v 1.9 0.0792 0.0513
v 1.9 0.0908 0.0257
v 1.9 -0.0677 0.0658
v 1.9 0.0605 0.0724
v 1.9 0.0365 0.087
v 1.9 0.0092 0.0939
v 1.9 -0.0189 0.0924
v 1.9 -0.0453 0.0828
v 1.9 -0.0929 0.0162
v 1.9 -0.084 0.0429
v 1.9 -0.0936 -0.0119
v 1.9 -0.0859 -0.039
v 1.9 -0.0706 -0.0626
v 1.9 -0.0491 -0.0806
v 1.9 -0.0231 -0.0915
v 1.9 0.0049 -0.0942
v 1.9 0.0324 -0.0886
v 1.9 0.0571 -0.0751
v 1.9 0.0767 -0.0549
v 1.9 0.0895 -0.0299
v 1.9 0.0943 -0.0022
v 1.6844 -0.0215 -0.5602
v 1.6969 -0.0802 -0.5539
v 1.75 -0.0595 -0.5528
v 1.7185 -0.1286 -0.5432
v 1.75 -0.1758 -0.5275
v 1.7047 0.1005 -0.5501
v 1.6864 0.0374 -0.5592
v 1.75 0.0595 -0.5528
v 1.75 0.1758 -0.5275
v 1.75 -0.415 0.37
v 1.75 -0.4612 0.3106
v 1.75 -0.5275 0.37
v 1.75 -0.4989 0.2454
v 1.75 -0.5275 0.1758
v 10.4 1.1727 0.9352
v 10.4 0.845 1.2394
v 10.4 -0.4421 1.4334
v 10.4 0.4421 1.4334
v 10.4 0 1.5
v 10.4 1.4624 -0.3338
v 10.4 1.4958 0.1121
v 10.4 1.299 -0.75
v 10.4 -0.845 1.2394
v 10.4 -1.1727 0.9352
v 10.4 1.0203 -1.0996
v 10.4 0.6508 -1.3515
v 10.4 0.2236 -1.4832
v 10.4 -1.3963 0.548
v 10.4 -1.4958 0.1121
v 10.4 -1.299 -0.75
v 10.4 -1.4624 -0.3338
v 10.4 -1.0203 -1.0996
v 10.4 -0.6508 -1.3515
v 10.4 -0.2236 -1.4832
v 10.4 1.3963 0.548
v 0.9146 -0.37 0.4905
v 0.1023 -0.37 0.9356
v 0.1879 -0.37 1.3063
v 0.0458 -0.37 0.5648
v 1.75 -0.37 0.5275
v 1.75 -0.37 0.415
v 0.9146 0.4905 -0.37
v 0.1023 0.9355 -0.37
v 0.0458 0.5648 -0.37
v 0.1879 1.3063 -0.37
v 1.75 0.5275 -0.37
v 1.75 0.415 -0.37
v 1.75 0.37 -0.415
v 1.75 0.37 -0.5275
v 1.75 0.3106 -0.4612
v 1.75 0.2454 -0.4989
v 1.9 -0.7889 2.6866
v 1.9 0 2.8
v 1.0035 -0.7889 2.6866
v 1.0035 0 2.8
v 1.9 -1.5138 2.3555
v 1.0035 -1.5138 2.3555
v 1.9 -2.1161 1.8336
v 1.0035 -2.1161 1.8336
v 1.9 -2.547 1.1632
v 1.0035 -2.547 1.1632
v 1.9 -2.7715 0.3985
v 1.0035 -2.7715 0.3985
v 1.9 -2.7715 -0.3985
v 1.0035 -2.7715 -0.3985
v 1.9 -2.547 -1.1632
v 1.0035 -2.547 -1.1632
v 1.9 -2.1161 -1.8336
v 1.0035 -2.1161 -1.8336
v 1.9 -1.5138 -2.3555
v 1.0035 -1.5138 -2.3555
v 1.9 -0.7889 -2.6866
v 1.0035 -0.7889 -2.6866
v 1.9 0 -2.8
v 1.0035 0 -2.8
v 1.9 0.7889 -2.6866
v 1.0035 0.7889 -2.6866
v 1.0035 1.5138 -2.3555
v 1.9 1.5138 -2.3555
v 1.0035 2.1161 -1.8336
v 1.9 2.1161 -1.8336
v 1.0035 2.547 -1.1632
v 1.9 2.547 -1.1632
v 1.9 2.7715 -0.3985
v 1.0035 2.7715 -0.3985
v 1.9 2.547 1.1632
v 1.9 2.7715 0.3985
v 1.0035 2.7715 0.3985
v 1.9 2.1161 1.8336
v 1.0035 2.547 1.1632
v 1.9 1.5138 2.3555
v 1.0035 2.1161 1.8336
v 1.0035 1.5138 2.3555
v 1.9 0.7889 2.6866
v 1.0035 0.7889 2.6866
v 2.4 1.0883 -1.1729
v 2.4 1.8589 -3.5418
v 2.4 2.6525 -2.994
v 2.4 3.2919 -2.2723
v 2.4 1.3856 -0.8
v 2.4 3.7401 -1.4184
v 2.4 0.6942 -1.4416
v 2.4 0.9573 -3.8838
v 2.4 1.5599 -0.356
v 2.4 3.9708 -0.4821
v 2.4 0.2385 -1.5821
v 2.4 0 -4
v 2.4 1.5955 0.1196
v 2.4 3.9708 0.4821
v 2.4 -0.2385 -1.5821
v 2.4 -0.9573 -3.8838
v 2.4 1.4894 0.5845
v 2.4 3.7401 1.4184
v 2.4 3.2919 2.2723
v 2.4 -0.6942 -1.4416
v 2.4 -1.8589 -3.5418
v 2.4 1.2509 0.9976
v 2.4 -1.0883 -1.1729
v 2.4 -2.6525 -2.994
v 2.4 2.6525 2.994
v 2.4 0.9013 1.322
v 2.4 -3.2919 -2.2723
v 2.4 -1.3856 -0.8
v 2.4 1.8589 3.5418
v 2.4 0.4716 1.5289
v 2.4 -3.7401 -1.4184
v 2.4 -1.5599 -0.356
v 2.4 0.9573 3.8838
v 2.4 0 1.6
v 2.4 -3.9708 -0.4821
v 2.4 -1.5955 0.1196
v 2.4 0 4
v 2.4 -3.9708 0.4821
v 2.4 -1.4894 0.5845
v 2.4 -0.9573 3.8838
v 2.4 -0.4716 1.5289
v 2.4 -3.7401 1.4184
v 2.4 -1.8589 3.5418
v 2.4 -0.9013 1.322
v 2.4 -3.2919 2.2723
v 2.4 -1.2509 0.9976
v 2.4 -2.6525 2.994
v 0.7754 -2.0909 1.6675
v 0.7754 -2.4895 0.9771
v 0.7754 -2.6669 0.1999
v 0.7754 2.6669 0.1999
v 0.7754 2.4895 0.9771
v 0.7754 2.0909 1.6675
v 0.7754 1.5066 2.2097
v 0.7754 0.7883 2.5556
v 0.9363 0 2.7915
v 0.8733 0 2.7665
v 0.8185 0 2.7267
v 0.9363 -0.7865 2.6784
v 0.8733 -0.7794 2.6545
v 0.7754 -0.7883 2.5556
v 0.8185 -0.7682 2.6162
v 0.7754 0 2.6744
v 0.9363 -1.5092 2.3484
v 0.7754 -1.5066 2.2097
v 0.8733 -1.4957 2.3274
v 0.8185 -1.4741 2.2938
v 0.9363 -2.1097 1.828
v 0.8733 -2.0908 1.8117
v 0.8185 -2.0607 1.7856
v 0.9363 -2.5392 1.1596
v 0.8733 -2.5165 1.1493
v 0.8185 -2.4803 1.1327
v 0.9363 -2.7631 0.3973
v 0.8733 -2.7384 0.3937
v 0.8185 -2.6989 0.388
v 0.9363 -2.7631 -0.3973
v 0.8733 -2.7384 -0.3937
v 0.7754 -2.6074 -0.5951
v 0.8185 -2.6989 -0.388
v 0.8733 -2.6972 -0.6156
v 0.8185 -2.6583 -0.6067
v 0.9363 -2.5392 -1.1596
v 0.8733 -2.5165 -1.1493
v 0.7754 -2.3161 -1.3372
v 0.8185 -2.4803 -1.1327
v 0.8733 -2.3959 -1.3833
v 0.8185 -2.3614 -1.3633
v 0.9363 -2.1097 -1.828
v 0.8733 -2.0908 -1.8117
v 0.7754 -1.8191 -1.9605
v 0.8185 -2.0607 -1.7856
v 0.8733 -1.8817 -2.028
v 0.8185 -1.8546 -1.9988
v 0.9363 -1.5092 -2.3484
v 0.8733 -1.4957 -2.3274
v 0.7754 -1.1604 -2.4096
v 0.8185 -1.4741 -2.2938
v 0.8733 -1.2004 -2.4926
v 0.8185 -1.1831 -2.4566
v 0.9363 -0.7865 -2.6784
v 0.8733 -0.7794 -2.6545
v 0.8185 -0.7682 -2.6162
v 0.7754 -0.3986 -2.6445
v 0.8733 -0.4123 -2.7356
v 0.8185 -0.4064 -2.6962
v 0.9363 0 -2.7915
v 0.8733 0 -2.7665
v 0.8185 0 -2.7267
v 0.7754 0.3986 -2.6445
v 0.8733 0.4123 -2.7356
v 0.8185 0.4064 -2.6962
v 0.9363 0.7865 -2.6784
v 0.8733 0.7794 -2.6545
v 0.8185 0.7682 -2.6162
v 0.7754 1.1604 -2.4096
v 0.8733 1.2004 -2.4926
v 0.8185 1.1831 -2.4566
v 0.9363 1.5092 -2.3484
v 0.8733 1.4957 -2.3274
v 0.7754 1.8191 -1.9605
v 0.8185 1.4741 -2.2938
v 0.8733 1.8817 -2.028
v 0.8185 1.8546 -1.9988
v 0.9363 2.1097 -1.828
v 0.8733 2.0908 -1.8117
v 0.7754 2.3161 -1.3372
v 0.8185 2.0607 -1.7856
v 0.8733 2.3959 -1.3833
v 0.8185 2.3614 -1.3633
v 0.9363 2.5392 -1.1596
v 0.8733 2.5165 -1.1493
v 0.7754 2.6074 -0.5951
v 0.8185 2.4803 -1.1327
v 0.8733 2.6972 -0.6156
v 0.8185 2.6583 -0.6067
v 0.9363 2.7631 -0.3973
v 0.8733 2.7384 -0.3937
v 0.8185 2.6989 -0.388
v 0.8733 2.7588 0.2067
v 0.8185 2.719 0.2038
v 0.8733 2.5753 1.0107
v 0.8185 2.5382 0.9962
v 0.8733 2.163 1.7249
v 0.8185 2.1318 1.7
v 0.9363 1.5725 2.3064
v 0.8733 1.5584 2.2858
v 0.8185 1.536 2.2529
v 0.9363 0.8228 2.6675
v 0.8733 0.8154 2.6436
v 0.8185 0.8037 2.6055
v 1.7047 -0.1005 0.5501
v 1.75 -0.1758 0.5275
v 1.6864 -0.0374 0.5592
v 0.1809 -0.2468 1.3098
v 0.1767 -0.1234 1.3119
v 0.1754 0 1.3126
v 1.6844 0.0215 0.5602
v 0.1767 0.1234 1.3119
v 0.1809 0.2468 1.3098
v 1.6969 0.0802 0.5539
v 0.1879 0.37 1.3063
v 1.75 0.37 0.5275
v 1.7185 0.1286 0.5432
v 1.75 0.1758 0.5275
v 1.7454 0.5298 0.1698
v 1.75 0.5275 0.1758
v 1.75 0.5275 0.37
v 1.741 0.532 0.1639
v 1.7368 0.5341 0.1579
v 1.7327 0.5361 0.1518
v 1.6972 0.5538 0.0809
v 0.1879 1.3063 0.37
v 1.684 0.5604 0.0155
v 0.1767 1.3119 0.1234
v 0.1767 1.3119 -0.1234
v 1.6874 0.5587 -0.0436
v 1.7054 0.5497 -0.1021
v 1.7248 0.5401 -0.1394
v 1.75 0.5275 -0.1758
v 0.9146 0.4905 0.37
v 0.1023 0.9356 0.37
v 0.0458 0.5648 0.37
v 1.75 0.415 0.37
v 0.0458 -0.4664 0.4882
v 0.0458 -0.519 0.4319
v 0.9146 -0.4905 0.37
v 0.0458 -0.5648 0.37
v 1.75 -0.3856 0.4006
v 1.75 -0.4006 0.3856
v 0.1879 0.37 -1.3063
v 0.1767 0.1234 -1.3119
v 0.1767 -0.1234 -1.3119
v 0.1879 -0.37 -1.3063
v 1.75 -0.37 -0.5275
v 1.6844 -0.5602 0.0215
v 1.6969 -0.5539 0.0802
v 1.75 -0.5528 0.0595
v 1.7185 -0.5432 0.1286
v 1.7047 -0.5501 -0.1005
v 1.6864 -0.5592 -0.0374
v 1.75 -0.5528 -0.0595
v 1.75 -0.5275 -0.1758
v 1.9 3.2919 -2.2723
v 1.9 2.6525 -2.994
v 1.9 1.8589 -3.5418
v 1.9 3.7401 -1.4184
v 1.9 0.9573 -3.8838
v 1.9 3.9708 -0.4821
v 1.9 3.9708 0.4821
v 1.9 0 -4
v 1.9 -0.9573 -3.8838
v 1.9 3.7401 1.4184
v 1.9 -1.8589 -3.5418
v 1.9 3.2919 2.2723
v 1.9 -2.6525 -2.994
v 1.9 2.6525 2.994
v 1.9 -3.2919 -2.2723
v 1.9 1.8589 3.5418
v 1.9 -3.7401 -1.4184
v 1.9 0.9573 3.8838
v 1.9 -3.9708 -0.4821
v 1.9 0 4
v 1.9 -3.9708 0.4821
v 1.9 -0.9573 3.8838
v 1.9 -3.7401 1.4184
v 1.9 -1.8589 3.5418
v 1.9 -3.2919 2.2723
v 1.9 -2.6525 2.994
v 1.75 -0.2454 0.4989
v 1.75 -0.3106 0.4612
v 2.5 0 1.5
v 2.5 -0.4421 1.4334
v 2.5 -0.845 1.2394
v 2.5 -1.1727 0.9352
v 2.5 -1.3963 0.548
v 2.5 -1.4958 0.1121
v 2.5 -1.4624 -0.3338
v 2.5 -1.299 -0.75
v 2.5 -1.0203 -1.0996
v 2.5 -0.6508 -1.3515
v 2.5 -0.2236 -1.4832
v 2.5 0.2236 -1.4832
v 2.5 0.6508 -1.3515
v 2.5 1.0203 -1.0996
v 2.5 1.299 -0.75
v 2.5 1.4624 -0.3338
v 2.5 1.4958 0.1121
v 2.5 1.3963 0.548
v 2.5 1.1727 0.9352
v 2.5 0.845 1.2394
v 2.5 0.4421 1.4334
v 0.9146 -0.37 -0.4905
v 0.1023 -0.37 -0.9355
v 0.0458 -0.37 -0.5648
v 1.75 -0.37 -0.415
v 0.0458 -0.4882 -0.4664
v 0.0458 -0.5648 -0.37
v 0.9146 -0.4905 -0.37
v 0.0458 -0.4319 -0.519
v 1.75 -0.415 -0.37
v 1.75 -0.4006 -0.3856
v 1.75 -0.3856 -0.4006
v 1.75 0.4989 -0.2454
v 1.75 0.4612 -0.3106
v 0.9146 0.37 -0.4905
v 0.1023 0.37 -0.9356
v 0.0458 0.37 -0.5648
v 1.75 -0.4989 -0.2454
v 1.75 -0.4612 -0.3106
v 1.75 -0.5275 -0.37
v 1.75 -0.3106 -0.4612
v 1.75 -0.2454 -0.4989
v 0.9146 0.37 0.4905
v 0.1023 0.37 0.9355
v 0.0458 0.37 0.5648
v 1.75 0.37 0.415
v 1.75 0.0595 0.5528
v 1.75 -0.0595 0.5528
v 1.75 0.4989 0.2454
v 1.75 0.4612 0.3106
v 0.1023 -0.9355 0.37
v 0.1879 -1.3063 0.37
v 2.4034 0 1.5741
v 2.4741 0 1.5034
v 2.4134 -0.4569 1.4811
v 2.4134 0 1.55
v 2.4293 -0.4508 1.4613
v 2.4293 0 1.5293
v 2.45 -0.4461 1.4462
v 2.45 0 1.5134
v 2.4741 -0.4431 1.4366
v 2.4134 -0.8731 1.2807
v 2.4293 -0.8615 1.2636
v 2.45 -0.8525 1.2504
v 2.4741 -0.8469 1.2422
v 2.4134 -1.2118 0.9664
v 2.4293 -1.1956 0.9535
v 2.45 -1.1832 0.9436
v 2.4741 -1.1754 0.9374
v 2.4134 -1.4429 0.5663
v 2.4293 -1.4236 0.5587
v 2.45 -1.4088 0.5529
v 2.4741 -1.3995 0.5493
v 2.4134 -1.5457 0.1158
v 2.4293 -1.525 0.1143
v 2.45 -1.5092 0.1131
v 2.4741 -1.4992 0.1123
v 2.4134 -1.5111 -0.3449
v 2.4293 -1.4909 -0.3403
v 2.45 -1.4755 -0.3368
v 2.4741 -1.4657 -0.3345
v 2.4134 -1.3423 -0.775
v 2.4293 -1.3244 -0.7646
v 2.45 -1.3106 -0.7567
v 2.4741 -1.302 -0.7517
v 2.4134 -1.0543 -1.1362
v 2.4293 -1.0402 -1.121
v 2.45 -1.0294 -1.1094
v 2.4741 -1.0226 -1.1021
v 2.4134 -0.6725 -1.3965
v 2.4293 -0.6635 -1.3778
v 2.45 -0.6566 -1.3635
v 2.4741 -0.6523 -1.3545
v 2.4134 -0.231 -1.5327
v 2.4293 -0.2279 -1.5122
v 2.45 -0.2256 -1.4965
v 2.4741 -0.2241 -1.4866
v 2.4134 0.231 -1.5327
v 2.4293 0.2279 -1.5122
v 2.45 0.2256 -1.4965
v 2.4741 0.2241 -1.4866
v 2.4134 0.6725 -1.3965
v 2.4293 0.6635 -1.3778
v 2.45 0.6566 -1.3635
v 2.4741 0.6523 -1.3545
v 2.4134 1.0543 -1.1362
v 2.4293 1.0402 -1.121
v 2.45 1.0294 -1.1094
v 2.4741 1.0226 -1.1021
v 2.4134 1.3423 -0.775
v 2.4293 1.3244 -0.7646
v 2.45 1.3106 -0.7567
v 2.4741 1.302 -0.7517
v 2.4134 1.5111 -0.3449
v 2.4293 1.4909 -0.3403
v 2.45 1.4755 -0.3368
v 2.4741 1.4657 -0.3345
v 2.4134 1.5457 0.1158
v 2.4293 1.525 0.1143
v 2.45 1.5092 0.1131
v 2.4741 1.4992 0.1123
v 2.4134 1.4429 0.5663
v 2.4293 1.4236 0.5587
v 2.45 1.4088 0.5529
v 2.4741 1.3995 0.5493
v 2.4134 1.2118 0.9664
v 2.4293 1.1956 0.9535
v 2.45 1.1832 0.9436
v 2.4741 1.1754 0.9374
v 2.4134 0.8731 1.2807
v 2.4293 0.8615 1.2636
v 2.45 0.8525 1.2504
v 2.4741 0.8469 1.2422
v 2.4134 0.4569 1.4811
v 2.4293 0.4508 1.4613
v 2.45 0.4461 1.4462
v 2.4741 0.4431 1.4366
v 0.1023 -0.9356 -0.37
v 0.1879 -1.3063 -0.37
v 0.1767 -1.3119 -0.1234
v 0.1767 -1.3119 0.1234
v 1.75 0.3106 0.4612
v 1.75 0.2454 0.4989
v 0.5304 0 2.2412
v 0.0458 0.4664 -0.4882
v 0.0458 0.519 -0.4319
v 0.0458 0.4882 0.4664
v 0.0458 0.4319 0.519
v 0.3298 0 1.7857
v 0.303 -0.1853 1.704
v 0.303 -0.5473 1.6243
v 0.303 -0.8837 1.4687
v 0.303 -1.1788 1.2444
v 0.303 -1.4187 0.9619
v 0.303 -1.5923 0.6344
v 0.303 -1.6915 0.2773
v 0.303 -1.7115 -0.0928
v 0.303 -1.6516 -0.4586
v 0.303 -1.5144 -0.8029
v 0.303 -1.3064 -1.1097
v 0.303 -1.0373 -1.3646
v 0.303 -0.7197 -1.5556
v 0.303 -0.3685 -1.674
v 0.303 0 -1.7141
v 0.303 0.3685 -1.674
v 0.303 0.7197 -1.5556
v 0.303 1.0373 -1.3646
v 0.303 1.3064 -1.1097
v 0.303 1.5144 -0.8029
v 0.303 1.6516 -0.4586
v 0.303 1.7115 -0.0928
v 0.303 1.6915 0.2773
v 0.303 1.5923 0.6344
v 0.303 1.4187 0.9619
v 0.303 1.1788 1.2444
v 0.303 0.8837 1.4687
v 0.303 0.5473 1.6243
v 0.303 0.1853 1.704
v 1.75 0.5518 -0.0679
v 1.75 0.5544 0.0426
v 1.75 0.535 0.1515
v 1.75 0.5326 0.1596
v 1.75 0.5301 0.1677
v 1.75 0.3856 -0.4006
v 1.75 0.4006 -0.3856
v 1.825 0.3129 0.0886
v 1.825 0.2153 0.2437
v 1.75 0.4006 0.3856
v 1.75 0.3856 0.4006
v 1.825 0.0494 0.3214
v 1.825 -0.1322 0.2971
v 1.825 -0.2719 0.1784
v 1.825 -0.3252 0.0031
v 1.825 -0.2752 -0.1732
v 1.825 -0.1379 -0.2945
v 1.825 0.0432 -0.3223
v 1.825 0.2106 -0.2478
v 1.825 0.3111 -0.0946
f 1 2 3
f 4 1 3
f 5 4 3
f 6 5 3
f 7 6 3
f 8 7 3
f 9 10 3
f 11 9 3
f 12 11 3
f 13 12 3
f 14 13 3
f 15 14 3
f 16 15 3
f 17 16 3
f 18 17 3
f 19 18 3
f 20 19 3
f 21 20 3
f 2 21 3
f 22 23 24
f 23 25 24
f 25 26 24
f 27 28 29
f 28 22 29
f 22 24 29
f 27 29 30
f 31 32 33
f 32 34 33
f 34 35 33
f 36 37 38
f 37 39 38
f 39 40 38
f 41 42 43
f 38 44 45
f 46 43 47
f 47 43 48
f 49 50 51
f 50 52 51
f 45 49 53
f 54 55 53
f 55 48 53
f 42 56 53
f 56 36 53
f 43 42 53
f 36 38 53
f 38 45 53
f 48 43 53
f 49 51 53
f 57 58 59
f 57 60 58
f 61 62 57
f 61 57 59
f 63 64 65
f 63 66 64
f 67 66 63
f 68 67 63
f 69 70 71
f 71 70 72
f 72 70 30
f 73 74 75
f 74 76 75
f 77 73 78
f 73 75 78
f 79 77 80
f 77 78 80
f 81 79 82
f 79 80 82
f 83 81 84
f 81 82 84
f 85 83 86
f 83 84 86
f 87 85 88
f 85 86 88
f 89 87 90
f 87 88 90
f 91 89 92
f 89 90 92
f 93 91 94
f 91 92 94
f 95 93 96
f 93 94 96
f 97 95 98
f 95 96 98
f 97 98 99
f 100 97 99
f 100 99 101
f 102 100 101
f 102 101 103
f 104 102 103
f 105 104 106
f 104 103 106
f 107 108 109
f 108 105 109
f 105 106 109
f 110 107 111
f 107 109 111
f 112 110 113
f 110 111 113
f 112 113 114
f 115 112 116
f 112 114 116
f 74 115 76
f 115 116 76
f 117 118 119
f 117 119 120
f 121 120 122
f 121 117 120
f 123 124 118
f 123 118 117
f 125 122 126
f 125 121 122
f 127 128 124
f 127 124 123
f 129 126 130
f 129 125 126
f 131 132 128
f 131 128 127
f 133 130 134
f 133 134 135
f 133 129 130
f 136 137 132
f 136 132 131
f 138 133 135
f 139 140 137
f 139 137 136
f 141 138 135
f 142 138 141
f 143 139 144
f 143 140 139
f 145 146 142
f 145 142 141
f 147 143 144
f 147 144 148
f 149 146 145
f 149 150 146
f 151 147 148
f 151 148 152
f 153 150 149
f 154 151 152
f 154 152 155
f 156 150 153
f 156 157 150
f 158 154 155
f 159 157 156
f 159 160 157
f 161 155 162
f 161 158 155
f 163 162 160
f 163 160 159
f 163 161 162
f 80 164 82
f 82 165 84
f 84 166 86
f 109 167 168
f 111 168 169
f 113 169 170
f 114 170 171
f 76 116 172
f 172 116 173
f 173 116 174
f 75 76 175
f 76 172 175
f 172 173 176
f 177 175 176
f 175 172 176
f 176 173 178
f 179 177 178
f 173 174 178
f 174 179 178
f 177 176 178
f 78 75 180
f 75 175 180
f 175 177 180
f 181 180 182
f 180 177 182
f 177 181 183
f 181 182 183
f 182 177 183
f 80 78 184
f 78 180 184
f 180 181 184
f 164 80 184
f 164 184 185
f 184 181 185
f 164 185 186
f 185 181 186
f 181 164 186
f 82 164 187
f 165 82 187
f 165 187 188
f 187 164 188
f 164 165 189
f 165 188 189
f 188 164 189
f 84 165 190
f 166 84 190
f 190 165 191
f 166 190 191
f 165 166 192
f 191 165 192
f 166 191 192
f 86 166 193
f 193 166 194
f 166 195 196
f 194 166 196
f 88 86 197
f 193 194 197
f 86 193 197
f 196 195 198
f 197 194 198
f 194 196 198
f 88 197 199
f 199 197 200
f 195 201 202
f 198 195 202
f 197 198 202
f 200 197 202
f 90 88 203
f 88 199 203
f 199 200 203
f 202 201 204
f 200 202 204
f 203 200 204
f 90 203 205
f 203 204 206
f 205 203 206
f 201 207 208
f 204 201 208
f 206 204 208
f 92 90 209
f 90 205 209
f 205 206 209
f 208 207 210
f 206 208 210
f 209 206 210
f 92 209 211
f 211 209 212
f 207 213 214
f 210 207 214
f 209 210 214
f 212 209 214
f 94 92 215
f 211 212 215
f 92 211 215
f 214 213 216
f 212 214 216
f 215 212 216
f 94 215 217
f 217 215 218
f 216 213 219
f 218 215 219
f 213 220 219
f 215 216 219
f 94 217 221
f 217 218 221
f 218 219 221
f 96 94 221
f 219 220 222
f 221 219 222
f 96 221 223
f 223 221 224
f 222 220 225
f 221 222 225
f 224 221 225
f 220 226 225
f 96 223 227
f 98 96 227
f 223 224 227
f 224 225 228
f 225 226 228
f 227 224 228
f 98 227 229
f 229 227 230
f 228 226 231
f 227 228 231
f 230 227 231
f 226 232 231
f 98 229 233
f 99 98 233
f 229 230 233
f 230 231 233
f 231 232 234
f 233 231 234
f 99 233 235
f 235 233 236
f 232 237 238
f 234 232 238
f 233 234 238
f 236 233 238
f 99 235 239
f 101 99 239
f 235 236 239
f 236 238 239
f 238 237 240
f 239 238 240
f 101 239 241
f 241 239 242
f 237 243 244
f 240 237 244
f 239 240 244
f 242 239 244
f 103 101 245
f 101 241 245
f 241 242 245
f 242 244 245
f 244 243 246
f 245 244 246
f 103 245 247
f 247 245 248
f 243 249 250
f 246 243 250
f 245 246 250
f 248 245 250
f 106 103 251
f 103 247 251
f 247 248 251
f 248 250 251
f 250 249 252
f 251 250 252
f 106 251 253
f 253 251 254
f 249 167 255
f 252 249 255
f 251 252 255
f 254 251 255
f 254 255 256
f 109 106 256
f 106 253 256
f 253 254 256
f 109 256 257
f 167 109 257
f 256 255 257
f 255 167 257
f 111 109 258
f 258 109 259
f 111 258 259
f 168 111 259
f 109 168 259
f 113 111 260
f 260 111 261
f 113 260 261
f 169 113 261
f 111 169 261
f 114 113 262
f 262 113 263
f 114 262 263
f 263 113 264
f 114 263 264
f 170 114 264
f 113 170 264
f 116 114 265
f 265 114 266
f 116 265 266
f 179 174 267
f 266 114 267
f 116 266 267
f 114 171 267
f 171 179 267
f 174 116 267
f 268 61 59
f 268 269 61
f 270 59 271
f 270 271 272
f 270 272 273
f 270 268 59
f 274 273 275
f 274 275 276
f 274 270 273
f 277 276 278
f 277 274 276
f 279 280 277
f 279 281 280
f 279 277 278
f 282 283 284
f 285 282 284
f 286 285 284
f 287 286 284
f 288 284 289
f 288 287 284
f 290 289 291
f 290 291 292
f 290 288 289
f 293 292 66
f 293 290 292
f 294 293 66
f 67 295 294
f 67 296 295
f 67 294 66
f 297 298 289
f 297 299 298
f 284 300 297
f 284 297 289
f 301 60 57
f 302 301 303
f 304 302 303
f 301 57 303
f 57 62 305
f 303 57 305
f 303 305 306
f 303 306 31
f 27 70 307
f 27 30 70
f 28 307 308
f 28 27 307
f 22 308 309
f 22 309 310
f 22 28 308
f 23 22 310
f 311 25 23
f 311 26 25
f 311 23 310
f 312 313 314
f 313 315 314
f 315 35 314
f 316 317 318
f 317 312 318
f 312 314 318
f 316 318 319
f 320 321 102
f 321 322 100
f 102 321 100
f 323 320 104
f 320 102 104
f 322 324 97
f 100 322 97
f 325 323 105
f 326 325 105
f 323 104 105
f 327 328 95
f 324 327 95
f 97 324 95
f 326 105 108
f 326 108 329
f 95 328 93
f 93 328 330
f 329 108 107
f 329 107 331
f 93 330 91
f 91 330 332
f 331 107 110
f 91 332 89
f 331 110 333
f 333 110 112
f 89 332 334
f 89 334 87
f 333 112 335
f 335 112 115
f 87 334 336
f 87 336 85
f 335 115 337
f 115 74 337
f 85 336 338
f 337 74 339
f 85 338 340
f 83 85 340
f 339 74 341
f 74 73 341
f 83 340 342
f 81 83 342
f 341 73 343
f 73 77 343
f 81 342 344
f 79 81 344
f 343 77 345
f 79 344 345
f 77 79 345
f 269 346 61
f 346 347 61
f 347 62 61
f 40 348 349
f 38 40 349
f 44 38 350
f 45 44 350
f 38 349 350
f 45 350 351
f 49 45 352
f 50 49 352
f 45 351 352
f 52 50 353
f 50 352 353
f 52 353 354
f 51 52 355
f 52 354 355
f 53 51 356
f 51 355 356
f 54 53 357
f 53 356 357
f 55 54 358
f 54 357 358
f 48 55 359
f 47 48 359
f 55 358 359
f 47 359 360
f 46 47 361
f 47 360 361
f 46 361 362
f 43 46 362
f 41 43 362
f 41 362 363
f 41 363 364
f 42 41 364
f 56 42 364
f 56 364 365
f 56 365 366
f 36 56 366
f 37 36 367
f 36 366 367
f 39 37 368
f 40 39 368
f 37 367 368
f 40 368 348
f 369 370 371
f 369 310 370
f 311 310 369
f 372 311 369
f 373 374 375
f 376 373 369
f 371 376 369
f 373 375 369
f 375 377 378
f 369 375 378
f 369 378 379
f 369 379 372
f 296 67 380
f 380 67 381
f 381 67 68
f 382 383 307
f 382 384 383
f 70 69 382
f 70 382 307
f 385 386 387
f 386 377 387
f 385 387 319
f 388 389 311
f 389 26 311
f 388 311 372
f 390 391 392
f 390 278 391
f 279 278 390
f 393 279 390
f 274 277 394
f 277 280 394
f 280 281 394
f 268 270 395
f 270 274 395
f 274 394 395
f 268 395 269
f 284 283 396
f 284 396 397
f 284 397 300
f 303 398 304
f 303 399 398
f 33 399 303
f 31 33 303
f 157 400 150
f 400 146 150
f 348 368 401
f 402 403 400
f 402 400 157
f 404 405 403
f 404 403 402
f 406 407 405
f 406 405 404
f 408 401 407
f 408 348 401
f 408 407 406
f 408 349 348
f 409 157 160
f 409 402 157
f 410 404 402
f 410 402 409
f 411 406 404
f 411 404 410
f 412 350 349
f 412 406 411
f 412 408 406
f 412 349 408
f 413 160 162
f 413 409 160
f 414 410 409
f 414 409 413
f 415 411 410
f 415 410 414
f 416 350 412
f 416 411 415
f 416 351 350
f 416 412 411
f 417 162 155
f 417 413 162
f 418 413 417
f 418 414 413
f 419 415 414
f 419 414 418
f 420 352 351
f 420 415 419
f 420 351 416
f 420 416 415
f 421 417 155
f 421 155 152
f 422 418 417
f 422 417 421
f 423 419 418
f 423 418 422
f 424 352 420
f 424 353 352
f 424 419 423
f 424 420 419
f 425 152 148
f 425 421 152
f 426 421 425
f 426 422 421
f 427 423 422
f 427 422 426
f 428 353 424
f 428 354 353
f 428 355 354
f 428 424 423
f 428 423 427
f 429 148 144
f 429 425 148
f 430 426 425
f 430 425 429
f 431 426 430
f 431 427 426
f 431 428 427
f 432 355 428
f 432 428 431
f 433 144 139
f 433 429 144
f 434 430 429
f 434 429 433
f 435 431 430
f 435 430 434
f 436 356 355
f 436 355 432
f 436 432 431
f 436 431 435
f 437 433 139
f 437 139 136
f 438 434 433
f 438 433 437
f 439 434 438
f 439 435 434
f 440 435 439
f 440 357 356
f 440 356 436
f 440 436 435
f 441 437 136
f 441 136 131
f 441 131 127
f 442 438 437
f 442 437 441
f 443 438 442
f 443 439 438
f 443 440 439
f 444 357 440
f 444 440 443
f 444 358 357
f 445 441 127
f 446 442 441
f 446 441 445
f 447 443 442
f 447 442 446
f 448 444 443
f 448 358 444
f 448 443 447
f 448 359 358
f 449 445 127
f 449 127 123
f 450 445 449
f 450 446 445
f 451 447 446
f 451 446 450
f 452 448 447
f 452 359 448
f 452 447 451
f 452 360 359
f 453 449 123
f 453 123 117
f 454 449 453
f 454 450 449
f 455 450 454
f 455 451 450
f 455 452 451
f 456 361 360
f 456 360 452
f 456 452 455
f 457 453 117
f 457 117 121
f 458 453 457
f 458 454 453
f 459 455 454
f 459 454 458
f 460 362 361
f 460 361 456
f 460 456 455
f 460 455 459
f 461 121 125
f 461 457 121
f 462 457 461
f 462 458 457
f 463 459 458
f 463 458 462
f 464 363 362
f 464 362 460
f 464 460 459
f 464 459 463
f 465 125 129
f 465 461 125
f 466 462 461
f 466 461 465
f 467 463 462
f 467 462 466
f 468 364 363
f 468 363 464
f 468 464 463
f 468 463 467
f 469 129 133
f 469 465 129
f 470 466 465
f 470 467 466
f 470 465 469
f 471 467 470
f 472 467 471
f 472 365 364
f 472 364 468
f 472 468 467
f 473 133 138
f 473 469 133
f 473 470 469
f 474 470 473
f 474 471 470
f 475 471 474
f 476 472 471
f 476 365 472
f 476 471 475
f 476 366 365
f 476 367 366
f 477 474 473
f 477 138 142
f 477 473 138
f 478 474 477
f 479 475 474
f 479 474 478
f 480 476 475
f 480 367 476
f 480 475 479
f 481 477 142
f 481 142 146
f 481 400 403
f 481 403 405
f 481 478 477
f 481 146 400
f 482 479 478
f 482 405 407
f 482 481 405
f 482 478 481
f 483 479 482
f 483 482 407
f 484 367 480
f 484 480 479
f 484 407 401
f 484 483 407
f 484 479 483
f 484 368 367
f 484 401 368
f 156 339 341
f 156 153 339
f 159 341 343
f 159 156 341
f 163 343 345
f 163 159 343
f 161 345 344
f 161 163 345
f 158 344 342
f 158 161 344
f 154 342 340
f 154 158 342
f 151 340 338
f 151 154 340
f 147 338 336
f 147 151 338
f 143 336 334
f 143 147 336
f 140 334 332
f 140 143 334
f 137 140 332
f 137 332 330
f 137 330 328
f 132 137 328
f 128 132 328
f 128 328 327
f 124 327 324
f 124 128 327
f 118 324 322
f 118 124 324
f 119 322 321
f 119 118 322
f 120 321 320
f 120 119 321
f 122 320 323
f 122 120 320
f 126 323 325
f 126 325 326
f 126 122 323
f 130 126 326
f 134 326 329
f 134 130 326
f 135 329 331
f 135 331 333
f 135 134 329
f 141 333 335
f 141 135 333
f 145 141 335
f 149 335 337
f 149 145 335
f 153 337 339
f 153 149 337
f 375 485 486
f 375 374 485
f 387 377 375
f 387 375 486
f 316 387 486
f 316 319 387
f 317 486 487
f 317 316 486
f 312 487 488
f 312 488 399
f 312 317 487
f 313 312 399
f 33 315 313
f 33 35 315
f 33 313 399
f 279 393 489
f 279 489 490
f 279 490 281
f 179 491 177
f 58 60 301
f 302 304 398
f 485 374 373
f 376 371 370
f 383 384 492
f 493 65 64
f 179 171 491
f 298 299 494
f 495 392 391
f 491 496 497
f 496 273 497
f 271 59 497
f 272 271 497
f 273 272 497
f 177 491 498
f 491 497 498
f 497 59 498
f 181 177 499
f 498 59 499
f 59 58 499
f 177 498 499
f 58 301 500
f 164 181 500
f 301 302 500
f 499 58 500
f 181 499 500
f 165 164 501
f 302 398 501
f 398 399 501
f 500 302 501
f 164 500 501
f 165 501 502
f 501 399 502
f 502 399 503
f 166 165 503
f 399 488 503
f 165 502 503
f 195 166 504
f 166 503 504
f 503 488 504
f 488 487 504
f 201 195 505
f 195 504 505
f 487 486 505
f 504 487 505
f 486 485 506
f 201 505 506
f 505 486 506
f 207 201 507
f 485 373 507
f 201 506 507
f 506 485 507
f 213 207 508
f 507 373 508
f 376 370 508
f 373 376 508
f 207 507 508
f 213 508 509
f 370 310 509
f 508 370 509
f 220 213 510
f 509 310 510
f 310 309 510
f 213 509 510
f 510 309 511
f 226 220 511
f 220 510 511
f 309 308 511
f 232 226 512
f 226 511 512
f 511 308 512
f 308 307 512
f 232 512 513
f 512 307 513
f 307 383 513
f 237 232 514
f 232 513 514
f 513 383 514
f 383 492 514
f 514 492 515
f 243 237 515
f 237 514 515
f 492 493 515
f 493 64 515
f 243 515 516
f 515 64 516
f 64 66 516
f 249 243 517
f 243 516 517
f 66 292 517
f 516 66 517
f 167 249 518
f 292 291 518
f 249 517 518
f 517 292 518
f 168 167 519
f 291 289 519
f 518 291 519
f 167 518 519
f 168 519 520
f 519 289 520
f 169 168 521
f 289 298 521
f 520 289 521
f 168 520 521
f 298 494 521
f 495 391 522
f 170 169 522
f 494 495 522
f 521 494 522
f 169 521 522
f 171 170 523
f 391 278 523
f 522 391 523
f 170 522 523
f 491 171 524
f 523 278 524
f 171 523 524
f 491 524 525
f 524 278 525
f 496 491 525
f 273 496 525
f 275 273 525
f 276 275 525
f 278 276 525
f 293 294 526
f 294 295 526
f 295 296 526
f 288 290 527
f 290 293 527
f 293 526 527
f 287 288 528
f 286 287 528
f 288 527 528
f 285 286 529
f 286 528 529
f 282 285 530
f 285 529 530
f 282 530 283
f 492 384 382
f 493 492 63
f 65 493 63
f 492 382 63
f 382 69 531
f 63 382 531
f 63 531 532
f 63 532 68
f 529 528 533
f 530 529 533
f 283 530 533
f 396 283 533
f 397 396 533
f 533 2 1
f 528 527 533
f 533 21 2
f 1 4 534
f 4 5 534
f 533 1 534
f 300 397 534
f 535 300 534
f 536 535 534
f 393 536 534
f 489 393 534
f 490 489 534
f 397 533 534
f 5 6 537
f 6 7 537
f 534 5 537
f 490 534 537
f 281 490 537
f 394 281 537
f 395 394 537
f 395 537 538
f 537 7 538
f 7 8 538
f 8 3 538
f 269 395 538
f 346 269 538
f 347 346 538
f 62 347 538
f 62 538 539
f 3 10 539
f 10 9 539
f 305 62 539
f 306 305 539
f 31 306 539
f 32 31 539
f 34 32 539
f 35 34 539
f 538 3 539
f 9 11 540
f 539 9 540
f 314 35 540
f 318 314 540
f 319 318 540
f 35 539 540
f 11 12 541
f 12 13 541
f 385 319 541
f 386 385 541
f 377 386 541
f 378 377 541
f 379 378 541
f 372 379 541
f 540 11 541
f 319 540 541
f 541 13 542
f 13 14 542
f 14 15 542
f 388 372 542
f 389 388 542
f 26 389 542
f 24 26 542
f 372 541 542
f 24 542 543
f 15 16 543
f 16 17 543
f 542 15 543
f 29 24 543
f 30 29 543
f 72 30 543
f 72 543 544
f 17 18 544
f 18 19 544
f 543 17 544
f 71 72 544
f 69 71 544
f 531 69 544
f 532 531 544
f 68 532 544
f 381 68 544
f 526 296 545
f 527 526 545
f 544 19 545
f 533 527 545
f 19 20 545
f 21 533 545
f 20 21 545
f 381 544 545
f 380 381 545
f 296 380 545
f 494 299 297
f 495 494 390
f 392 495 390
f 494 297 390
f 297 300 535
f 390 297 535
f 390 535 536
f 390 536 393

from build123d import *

# Parameters (mm, degrees)
FILLET1_R    = 0.1
RECPAT_COUNT = 2
RECPAT_ANGLE = 90
SCHIZZO1_W   = 0.5
SCHIZZO1_H   = 4


with BuildPart() as part:
    # BodySke → Base-Revolve (revolve)
    with BuildSketch(Plane.XY, mode=Mode.PRIVATE) as base_revolve_sk:
        with BuildLine():
            Line((2.4, 1.5), (2.4, 2.8))
            Line((2.4, 2.8), (1.003501533, 2.8))
            ThreePointArc((1.003501533, 2.8), (0.873295971, 2.76653015), (0.775371599, 2.674418605))
            ThreePointArc((0.775371599, 2.674418605), (0.197753546, 1.392274756), (0, 0))
            Line((0, 0), (10.4, 0))
            Line((10.4, 0), (10.4, 1.5))
            Line((10.4, 1.5), (2.4, 1.5))
        make_face()
    revolve(base_revolve_sk.sketch.rotate(Axis((1.003501533, 0, 0), (1, 0, 0)), 90), axis=Axis((1.003501533, 0, 0), (1, 0, 0)))

    # Fillet1
    fillet1_edges = [part.edges().sort_by_distance(p)[0] for p in [
        (2.4, 0, -1.5),
    ]]
    fillet(fillet1_edges, radius=FILLET1_R)

    # Sketch3 → Recess section 0
    with BuildSketch(Plane(origin=(0, 0, 0), x_dir=(0, 0, -1), z_dir=(1, 0, 0))):
        with BuildLine():
            Line((0.37, -1.4), (-0.37, -1.4))
            Line((-0.37, -1.4), (-0.37, 1.4))
            Line((-0.37, 1.4), (0.37, 1.4))
            Line((0.37, 1.4), (0.37, -1.4))
        make_face()
    # Sketch4 → Recess section 1
    with BuildSketch(Plane(origin=(1.75, 0, 0), x_dir=(0, 0, -1), z_dir=(1, 0, 0))):
        with BuildLine():
            Line((0.37, -0.527482332), (-0.37, -0.527482332))
            Line((-0.37, -0.527482332), (-0.37, 0.527482332))
            Line((-0.37, 0.527482332), (0.37, 0.527482332))
            Line((0.37, 0.527482332), (0.37, -0.527482332))
        make_face()
    recess = loft(mode=Mode.SUBTRACT)

    # RecPat: Recess ×2 about axis
    recpat_axis = Axis((0, 0, 0), (1, 0, 0))
    for i in range(1, RECPAT_COUNT):
        add(recess.rotate(recpat_axis, i * RECPAT_ANGLE / (RECPAT_COUNT - 1)), mode=Mode.SUBTRACT)

    # RecCorSke → RecessCore (revolve, cut)
    with BuildSketch(Plane.XY, mode=Mode.PRIVATE) as recesscore_sk:
        Polygon((0, 0), (0, 0.678371921), (1.75, 0.556), (1.930655351, 0), align=None)
    revolve(recesscore_sk.sketch.rotate(Axis((-3.175, 0, 0), (1, 0, 0)), 15.814025638), axis=Axis((-3.175, 0, 0), (1, 0, 0)), mode=Mode.SUBTRACT)

    # Schizzo1 → Rivoluzione2 (revolve)
    with BuildSketch(Plane(origin=(0, 0, 0), x_dir=(1, 0, 0), z_dir=(0, 1, 0))):
        with Locations((2.15, -2)):
            Rectangle(SCHIZZO1_W, SCHIZZO1_H)
    revolve(axis=Axis((0, 0, 0), (1, 0, 0)))


solid = part.part
